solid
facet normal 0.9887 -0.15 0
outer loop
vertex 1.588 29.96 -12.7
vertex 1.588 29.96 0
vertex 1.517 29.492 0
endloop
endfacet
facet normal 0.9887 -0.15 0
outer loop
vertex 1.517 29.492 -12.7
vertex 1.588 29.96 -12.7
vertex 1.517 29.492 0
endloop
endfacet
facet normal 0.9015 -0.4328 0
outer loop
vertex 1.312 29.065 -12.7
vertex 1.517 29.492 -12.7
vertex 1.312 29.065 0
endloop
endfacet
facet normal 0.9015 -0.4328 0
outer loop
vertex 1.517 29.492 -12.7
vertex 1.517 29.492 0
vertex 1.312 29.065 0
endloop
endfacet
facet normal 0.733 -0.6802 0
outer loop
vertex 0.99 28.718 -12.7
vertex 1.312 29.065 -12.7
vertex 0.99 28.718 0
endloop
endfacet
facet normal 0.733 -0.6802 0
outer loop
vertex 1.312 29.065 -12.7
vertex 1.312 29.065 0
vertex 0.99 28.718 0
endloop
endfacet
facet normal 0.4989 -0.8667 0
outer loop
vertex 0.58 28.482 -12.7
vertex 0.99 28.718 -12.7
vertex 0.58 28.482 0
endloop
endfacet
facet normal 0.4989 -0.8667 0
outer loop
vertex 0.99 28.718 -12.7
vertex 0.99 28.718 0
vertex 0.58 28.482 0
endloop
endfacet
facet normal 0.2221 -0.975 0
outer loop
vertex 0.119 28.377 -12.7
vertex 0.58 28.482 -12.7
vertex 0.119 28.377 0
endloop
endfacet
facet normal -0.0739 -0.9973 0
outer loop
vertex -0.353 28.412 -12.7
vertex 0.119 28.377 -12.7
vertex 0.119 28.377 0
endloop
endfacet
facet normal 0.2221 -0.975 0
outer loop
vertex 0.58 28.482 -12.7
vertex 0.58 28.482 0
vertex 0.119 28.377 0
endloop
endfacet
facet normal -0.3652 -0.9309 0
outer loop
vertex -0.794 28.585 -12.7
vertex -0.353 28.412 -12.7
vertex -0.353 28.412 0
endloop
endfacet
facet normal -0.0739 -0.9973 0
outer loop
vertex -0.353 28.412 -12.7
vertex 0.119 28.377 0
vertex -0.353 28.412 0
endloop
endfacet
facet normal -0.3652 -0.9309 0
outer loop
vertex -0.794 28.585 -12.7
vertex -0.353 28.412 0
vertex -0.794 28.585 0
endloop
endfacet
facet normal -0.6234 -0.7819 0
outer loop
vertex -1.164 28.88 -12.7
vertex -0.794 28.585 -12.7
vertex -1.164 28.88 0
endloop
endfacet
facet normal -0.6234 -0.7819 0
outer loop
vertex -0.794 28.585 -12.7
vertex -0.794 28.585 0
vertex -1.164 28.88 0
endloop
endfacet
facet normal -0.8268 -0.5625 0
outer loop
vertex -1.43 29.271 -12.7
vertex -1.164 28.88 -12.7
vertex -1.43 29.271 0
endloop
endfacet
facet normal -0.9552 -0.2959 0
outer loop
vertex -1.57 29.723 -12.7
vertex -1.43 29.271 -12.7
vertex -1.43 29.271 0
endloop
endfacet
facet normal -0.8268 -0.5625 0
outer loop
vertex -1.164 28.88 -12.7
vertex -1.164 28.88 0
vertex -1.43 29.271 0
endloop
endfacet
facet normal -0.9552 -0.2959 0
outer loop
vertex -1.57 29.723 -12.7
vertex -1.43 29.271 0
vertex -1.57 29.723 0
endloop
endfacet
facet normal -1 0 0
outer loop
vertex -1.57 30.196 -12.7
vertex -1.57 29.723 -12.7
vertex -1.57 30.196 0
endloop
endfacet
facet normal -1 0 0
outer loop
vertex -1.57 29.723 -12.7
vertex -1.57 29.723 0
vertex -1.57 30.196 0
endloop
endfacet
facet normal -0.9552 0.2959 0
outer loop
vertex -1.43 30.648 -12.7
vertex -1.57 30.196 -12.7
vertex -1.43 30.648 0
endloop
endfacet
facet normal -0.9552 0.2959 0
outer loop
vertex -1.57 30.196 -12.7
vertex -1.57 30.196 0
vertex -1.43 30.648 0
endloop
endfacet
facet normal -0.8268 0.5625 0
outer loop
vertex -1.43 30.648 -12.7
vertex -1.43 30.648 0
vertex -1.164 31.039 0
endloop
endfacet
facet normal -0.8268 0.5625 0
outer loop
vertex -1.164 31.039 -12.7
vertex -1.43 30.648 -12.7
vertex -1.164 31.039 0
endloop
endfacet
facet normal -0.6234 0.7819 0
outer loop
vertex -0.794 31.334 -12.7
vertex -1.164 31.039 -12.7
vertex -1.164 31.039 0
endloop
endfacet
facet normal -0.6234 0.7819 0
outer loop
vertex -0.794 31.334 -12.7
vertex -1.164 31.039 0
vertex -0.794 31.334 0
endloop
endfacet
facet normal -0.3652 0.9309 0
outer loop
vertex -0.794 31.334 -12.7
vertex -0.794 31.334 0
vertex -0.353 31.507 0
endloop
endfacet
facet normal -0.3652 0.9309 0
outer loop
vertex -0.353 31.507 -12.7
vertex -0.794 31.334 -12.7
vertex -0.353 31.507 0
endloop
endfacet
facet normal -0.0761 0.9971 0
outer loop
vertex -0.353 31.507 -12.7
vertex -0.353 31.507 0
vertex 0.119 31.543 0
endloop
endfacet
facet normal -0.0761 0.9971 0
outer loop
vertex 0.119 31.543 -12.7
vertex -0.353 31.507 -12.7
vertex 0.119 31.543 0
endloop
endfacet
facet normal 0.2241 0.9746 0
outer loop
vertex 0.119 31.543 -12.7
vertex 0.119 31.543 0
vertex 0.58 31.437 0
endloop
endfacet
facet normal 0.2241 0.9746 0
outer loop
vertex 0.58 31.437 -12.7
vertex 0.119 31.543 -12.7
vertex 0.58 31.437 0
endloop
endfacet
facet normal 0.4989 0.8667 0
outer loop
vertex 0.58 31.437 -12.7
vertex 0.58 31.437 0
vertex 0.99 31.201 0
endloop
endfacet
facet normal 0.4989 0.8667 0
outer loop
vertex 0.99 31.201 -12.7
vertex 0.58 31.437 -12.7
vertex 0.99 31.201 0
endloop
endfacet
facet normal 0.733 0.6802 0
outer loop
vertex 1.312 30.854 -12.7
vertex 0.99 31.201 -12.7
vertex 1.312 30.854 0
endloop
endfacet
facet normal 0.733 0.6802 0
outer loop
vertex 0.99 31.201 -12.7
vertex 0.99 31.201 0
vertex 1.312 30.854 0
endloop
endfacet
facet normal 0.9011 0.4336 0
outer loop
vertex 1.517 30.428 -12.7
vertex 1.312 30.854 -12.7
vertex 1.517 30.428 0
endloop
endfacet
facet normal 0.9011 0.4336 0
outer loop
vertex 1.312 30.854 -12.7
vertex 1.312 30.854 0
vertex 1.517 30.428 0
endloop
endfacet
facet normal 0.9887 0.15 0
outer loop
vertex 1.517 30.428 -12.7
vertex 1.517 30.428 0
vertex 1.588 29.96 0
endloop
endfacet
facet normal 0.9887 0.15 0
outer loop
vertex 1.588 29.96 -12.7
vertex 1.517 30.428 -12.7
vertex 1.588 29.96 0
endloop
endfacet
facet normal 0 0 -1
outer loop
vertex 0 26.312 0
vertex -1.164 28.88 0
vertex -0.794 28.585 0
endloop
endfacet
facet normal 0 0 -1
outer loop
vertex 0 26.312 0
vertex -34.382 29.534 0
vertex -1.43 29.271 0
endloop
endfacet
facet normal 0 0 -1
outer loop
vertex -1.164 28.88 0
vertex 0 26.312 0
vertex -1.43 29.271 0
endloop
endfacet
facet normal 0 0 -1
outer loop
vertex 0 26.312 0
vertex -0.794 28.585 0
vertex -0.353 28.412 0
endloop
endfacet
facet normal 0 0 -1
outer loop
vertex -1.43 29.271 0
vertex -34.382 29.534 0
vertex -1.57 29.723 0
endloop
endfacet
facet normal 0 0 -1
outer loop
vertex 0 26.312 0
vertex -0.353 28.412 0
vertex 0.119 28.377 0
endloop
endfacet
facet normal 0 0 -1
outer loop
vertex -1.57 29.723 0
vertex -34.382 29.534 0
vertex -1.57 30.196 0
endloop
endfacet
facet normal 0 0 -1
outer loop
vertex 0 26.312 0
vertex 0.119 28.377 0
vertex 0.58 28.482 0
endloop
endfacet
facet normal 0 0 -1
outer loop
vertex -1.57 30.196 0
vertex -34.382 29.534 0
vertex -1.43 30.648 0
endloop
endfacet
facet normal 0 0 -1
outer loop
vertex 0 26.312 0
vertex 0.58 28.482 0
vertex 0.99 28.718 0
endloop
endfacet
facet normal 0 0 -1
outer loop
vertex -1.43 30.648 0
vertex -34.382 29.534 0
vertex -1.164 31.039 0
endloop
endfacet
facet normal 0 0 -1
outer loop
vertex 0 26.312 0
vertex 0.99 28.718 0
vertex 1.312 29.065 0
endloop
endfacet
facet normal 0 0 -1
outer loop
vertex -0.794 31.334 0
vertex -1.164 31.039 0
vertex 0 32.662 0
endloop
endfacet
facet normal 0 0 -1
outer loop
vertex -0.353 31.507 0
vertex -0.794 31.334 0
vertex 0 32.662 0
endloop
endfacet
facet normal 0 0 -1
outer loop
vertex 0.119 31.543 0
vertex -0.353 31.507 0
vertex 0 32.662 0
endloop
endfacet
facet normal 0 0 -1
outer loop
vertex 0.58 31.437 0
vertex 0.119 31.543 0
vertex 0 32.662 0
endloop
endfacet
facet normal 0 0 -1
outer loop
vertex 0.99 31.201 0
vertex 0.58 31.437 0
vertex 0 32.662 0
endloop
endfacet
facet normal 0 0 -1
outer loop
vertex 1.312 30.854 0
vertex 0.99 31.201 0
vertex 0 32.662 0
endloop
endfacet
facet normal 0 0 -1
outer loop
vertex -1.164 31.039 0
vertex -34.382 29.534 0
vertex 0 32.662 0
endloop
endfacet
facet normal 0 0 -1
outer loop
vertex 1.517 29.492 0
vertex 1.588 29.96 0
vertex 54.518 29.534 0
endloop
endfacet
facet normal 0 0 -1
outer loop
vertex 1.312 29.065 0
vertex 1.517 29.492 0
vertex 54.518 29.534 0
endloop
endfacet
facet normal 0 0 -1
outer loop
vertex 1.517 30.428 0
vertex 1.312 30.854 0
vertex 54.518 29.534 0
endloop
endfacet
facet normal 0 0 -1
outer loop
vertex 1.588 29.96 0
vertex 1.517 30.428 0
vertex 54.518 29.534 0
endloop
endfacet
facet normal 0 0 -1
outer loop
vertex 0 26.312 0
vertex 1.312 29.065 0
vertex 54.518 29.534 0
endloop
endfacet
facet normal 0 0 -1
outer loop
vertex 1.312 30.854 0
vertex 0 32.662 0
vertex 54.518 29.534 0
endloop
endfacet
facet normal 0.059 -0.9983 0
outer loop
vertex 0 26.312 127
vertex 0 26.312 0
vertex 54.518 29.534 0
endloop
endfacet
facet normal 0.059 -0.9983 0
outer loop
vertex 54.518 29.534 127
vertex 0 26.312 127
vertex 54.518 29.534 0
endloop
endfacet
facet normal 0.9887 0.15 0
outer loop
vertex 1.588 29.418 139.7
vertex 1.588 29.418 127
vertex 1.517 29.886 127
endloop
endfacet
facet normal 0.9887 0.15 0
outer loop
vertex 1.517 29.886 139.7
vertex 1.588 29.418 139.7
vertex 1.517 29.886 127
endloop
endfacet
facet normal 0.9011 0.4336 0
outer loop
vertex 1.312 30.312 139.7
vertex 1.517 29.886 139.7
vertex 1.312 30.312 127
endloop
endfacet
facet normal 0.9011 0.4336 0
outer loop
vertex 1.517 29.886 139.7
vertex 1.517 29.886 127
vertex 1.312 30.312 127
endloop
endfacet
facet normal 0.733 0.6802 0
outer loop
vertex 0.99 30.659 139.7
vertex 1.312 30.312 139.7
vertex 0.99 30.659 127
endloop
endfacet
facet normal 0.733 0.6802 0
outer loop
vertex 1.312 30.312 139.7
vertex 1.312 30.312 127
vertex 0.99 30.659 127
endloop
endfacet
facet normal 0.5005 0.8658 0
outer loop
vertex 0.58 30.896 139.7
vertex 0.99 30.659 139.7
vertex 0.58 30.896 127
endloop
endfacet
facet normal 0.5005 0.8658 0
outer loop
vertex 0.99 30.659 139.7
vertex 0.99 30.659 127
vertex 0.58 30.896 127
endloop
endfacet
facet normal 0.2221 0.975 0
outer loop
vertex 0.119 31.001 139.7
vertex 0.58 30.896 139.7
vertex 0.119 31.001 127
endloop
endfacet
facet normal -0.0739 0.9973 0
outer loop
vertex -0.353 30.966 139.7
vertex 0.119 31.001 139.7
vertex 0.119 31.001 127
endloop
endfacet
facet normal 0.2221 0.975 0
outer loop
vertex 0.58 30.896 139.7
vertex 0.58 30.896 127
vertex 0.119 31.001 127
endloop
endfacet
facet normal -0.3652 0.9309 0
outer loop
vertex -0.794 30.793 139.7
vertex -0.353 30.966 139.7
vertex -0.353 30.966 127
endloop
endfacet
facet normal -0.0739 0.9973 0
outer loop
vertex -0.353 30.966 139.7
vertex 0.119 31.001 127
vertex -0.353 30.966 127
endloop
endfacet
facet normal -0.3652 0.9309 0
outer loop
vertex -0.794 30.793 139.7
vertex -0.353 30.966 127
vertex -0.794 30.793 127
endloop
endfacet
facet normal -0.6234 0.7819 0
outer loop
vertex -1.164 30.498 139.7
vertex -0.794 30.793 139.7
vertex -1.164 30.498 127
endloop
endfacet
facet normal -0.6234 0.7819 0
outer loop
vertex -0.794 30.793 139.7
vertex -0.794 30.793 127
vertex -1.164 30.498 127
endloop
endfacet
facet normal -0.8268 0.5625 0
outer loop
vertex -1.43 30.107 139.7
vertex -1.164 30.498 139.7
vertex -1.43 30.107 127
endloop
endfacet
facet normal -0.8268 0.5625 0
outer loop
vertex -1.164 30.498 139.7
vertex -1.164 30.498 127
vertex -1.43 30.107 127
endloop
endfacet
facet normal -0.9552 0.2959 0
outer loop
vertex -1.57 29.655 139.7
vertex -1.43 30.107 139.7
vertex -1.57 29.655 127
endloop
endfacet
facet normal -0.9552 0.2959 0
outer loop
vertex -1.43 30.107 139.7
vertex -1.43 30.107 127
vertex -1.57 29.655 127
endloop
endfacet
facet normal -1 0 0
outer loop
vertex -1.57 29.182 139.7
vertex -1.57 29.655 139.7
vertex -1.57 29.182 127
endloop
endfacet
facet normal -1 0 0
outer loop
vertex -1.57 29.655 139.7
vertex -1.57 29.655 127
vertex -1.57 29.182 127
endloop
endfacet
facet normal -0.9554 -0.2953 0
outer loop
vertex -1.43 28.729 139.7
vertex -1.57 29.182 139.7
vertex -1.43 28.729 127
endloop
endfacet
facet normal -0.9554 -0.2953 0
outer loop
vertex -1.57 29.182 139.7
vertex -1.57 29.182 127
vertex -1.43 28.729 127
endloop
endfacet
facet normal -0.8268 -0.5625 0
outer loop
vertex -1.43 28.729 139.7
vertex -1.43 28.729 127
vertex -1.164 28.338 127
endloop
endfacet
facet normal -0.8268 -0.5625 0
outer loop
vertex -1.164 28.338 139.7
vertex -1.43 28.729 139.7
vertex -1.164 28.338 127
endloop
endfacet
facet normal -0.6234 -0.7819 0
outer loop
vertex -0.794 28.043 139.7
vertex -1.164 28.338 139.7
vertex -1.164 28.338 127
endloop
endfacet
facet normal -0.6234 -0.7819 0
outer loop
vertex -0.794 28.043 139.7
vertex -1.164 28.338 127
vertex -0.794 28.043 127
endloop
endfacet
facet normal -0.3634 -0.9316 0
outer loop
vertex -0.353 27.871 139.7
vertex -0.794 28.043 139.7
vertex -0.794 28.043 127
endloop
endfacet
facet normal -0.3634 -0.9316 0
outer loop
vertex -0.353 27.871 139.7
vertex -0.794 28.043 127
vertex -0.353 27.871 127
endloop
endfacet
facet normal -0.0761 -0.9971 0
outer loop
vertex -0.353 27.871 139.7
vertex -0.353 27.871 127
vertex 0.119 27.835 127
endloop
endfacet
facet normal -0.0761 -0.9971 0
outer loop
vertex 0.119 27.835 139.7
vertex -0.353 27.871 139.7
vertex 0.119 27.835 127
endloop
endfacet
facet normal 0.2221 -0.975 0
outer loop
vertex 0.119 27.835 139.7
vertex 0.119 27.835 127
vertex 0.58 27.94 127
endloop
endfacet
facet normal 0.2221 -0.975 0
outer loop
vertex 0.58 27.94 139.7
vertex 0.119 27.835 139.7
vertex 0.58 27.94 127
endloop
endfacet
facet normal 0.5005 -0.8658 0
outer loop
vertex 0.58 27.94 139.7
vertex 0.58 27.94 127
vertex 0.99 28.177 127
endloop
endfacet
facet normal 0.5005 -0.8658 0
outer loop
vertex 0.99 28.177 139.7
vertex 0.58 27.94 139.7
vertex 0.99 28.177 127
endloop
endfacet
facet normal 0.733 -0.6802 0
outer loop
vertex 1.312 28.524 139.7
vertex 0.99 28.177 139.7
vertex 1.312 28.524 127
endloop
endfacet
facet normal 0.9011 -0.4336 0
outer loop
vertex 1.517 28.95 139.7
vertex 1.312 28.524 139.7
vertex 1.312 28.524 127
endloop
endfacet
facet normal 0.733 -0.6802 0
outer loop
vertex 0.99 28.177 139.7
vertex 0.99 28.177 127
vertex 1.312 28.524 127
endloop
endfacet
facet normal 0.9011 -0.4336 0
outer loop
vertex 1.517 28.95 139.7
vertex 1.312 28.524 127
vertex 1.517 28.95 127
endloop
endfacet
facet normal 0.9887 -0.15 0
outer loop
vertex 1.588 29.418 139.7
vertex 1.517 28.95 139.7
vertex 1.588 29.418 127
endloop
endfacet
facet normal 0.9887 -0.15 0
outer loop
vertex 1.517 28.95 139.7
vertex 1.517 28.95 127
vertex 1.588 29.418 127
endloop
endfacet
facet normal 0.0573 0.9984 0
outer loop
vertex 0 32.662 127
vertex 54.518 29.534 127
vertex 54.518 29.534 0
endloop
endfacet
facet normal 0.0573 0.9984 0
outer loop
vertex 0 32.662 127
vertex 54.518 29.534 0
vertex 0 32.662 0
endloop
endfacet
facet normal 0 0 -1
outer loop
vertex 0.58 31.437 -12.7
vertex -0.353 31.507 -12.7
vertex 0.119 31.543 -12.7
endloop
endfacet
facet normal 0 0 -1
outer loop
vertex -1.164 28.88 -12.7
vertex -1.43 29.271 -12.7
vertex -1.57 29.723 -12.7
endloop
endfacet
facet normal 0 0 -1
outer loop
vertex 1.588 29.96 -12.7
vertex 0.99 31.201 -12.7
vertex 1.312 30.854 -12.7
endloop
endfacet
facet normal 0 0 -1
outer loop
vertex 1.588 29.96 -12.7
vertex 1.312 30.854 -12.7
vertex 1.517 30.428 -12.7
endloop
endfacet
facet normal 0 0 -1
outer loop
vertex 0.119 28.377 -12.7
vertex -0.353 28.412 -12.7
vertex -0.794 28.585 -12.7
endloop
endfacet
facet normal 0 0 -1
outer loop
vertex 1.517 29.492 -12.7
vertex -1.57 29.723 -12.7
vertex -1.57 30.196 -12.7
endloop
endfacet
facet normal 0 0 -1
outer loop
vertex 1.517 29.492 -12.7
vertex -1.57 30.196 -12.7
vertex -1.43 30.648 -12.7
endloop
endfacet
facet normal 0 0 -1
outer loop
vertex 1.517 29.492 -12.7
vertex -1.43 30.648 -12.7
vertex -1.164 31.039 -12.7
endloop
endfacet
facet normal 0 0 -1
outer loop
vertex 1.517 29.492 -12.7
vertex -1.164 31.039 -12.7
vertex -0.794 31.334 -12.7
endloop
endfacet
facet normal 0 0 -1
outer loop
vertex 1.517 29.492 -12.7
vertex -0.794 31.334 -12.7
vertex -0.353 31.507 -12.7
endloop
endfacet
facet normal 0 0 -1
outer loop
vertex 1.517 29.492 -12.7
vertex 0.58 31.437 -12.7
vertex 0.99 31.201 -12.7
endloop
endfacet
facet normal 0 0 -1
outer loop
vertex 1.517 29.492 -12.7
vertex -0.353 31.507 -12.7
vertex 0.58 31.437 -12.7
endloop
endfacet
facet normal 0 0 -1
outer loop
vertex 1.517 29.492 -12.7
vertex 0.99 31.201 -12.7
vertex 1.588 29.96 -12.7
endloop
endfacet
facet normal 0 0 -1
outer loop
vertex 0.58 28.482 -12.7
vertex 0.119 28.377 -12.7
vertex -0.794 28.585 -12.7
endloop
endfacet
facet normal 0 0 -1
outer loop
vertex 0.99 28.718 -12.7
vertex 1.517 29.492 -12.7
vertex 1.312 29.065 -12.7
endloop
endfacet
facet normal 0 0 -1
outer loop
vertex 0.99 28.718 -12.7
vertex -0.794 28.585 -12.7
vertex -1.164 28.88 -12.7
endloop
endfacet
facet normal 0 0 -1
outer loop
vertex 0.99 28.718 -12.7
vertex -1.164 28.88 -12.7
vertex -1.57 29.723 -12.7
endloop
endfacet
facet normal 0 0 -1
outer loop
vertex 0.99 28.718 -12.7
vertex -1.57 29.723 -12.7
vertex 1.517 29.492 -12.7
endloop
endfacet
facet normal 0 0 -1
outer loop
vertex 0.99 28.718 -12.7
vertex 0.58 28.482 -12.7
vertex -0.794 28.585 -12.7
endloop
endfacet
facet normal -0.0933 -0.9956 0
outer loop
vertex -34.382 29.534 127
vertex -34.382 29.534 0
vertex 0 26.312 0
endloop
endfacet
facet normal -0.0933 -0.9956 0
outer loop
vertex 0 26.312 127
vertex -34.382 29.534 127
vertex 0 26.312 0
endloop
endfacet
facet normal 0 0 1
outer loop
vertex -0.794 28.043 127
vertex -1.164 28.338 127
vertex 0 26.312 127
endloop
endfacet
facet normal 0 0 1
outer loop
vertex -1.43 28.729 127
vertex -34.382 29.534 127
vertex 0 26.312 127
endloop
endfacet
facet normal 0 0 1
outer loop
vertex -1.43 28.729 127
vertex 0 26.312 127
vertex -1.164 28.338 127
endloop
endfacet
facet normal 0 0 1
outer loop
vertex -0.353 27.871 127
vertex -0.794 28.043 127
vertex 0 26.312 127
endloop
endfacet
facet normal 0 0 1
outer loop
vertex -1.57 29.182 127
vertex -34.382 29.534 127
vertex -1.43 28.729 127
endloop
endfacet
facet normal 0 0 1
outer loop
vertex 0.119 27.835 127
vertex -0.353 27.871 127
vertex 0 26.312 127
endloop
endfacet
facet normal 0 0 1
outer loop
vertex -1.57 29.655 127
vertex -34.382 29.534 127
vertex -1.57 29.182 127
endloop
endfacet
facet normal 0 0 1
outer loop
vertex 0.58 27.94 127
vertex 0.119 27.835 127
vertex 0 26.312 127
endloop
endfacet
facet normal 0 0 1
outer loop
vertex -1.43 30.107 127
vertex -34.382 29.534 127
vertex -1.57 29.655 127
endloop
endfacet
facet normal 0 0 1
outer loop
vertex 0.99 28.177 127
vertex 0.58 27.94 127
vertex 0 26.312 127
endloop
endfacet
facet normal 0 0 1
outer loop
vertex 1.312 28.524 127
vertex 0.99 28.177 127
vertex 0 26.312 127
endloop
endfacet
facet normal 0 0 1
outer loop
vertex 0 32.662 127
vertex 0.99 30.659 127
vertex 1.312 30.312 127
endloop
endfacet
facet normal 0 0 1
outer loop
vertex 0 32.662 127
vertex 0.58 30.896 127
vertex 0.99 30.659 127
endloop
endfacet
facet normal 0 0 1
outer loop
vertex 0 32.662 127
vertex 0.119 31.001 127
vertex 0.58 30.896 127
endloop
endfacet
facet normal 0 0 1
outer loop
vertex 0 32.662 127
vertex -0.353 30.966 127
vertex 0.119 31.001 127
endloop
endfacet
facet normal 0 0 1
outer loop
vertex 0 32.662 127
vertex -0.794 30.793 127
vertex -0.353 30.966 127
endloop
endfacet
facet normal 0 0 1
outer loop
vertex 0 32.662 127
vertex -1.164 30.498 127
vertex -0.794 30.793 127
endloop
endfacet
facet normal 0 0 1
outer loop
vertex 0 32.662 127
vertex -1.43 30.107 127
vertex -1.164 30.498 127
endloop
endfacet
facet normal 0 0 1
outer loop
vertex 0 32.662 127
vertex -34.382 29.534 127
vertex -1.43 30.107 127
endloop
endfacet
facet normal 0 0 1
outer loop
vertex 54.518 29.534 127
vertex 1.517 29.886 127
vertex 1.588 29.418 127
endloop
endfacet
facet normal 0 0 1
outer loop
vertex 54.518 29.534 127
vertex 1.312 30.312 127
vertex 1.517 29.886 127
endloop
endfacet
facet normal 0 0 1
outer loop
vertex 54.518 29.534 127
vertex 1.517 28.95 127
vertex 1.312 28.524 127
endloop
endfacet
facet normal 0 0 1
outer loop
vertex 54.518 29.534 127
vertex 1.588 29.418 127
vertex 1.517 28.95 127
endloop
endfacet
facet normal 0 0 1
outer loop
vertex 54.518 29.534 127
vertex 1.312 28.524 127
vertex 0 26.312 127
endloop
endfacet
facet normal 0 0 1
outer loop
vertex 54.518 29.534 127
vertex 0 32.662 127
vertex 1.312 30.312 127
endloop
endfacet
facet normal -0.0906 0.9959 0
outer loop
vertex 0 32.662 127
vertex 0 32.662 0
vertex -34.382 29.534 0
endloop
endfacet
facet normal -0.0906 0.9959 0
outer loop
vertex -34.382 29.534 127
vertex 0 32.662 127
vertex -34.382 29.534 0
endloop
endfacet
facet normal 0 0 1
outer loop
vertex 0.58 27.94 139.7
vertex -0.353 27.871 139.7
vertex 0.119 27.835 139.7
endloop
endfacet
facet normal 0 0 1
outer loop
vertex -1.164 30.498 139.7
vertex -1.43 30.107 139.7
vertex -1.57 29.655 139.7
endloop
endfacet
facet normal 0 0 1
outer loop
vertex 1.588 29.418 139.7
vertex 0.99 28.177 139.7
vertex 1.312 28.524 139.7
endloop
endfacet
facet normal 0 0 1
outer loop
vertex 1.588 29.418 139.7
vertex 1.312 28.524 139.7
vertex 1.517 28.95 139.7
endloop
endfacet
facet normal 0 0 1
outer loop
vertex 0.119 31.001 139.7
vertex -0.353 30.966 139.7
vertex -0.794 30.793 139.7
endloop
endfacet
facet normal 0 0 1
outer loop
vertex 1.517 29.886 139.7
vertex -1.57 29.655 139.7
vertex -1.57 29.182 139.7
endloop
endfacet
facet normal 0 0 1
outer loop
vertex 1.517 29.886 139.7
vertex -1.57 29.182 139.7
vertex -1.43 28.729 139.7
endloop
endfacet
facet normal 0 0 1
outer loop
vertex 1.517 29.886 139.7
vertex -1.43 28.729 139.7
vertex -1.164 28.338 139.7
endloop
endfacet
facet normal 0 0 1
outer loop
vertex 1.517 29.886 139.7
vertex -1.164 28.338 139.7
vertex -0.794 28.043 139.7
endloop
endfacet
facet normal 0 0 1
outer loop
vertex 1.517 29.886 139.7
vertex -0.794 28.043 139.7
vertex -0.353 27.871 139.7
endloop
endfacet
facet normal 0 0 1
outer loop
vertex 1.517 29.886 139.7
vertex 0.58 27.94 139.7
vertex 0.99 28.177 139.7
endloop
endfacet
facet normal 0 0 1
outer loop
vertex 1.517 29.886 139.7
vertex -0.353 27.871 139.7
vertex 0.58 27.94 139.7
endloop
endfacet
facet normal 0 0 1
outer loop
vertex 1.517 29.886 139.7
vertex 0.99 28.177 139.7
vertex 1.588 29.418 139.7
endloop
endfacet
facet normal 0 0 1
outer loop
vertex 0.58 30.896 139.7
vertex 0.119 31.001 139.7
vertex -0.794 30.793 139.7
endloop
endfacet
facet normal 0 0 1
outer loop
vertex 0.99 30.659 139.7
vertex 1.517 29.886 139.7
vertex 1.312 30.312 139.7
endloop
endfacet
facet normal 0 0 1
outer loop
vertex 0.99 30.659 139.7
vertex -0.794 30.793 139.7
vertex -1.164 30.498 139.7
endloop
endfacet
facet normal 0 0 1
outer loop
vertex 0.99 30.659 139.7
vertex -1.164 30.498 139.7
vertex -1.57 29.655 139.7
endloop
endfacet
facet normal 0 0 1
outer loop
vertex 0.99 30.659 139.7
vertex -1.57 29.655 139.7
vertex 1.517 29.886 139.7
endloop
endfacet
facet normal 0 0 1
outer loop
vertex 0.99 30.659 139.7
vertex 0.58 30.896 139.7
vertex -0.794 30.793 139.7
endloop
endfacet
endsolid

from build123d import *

# Parameters (mm, degrees)
F1_DEPTH = 127
F2_R     = 1.5875
F3_DEPTH = 12.7
F4_R     = 1.5875
F5_DEPTH = 12.7


with BuildPart() as f1:
    # F0 (on Top) → F1 (new body)
    with BuildSketch(Plane.XY):
        Polygon((0, 32.662014), (-34.38163, 29.533893), (0, 26.312014), (54.51837, 29.533893), align=None)
    extrude(amount=F1_DEPTH)

    # F2 (on face) → F3 (join)
    with BuildSketch(Plane(origin=(0, 0, 0), x_dir=(1, 0, 0), z_dir=(0, 0, -1))):
        with Locations((0, -29.959638)):
            Circle(F2_R)
    extrude(amount=F3_DEPTH)

    # F4 (on face) → F5 (join)
    with BuildSketch(Plane.XY.offset(127)):
        with Locations((0, 29.418199)):
            Circle(F4_R)
    extrude(amount=F5_DEPTH)


solid = f1.part
